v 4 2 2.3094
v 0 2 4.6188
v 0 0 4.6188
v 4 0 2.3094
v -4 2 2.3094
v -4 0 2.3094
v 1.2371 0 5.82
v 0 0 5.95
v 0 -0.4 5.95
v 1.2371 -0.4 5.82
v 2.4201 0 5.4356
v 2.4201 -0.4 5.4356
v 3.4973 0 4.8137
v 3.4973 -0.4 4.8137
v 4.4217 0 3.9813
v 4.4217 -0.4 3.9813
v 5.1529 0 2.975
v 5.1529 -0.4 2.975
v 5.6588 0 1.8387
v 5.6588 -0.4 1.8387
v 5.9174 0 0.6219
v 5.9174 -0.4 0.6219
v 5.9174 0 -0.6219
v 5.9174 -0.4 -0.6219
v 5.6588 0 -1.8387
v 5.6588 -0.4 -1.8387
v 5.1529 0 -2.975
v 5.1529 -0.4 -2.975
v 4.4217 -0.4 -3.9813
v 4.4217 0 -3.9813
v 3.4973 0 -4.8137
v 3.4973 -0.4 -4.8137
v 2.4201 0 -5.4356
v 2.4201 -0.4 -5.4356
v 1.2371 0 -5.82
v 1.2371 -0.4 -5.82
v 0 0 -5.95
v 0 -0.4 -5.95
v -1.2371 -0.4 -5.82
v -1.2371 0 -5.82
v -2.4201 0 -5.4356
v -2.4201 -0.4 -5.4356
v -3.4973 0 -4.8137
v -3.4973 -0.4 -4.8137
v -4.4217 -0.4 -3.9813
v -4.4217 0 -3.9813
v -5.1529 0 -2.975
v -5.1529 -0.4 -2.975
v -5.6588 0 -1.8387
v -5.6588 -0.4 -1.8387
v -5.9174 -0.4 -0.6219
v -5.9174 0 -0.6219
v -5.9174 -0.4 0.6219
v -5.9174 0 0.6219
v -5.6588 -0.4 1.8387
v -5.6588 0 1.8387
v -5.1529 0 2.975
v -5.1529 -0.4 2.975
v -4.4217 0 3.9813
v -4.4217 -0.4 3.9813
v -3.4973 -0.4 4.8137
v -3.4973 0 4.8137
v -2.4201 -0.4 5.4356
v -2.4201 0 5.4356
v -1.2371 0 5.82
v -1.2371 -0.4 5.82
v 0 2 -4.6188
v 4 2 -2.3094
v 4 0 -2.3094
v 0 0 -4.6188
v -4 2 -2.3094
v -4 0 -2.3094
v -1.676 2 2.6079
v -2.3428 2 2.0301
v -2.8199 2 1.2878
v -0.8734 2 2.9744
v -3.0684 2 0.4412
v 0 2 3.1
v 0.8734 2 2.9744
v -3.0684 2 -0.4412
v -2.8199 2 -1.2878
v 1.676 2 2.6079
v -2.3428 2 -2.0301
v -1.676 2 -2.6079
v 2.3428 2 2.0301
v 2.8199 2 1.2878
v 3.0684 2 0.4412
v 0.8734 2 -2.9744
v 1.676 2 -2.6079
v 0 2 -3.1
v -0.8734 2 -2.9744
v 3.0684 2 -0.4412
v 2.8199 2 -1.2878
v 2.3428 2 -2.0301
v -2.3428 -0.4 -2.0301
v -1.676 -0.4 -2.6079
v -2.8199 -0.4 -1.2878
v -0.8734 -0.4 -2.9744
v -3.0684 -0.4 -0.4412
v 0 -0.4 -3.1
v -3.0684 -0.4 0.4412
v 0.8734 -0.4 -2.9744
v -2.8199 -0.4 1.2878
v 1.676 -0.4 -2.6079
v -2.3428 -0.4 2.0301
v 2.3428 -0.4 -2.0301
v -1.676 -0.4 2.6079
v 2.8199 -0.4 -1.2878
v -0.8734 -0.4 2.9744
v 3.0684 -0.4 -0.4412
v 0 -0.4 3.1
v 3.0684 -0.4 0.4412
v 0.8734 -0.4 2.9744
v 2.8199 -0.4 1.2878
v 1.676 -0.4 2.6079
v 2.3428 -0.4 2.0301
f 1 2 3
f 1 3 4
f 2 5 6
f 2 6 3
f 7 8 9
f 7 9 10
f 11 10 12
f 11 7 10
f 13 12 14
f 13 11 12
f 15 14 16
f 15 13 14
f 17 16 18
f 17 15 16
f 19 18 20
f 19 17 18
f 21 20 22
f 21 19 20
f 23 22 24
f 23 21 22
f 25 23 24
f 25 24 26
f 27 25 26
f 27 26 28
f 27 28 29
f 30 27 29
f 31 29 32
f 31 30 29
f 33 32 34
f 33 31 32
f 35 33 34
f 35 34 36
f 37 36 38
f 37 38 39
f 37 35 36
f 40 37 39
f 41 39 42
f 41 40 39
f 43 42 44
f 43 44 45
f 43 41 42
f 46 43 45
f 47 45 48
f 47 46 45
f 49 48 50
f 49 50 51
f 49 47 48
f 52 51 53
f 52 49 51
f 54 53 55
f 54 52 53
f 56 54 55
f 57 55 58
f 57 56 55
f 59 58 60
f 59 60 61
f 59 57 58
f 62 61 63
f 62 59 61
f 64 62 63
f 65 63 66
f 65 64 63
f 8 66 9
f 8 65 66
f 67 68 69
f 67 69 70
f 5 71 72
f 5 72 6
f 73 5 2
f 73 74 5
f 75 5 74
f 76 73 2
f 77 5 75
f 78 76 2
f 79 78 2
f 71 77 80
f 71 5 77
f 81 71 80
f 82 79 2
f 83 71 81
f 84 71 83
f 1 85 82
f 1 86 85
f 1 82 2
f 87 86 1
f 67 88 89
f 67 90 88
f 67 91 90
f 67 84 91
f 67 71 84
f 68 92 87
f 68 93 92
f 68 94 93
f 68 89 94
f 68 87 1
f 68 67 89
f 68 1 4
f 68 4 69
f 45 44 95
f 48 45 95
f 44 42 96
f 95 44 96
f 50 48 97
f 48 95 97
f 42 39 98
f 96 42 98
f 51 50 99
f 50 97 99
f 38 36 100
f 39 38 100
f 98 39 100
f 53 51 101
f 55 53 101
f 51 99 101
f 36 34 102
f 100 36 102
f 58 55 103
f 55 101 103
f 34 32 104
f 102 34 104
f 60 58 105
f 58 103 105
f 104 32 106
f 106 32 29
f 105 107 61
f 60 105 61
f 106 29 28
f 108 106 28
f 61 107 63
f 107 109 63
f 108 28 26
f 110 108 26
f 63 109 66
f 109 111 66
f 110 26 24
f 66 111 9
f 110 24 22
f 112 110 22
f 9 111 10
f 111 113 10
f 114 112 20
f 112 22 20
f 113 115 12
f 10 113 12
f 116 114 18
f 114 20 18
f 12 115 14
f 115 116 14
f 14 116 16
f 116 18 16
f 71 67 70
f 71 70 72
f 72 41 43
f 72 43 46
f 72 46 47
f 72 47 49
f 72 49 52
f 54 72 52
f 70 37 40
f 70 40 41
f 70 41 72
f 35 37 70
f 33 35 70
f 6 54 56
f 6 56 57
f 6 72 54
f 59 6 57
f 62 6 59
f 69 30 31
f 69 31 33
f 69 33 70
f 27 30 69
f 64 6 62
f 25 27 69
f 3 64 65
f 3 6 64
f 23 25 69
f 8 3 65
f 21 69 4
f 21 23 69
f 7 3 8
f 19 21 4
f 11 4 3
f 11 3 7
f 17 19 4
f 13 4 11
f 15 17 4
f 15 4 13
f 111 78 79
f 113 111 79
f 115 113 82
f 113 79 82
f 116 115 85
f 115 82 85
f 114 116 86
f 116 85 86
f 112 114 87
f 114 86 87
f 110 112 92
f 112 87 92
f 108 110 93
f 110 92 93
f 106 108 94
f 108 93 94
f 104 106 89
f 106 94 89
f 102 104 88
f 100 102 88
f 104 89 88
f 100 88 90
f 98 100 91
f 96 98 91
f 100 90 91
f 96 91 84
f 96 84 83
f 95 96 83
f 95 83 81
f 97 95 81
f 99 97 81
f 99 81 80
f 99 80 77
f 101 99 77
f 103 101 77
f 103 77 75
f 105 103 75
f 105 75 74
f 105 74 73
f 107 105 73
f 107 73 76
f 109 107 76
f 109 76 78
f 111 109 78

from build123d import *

# Parameters (mm, degrees)
SKETCH1_R           = 5.95
SKETCH1_R_2         = 3.1
BOSS_EXTRUDE1_DEPTH = 0.4
BOSS_EXTRUDE2_START = 2
SKETCH2_R           = 3.1
BOSS_EXTRUDE2_DEPTH = 2


with BuildPart() as part:
    # Sketch1 → Boss-Extrude1 (new body)
    with BuildSketch(Plane(origin=(0, 0, 0), x_dir=(1, 0, 0), z_dir=(0, 1, 0))):
        with Locations(Location((0, 0, 0), (0, 0, 270))):
            Circle(SKETCH1_R)
        with Locations(Location((0, 0, 0), (0, 0, 270))):
            Circle(SKETCH1_R_2, mode=Mode.SUBTRACT)
    extrude(amount=-BOSS_EXTRUDE1_DEPTH)

    # Sketch2 → Boss-Extrude2 (add)
    with BuildSketch(Plane(origin=(0, 0, 0), x_dir=(1, 0, 0), z_dir=(0, 1, 0)).offset(BOSS_EXTRUDE2_START)):
        Polygon((-4, -2.309401077), (0, -4.618802154), (4, -2.309401077), (4, 2.309401077), (0, 4.618802154), (-4, 2.309401077), align=None)
        with Locations(Location((0, 0, 0), (0, 0, 270))):
            Circle(SKETCH2_R, mode=Mode.SUBTRACT)
    extrude(amount=-BOSS_EXTRUDE2_DEPTH)


solid = part.part
